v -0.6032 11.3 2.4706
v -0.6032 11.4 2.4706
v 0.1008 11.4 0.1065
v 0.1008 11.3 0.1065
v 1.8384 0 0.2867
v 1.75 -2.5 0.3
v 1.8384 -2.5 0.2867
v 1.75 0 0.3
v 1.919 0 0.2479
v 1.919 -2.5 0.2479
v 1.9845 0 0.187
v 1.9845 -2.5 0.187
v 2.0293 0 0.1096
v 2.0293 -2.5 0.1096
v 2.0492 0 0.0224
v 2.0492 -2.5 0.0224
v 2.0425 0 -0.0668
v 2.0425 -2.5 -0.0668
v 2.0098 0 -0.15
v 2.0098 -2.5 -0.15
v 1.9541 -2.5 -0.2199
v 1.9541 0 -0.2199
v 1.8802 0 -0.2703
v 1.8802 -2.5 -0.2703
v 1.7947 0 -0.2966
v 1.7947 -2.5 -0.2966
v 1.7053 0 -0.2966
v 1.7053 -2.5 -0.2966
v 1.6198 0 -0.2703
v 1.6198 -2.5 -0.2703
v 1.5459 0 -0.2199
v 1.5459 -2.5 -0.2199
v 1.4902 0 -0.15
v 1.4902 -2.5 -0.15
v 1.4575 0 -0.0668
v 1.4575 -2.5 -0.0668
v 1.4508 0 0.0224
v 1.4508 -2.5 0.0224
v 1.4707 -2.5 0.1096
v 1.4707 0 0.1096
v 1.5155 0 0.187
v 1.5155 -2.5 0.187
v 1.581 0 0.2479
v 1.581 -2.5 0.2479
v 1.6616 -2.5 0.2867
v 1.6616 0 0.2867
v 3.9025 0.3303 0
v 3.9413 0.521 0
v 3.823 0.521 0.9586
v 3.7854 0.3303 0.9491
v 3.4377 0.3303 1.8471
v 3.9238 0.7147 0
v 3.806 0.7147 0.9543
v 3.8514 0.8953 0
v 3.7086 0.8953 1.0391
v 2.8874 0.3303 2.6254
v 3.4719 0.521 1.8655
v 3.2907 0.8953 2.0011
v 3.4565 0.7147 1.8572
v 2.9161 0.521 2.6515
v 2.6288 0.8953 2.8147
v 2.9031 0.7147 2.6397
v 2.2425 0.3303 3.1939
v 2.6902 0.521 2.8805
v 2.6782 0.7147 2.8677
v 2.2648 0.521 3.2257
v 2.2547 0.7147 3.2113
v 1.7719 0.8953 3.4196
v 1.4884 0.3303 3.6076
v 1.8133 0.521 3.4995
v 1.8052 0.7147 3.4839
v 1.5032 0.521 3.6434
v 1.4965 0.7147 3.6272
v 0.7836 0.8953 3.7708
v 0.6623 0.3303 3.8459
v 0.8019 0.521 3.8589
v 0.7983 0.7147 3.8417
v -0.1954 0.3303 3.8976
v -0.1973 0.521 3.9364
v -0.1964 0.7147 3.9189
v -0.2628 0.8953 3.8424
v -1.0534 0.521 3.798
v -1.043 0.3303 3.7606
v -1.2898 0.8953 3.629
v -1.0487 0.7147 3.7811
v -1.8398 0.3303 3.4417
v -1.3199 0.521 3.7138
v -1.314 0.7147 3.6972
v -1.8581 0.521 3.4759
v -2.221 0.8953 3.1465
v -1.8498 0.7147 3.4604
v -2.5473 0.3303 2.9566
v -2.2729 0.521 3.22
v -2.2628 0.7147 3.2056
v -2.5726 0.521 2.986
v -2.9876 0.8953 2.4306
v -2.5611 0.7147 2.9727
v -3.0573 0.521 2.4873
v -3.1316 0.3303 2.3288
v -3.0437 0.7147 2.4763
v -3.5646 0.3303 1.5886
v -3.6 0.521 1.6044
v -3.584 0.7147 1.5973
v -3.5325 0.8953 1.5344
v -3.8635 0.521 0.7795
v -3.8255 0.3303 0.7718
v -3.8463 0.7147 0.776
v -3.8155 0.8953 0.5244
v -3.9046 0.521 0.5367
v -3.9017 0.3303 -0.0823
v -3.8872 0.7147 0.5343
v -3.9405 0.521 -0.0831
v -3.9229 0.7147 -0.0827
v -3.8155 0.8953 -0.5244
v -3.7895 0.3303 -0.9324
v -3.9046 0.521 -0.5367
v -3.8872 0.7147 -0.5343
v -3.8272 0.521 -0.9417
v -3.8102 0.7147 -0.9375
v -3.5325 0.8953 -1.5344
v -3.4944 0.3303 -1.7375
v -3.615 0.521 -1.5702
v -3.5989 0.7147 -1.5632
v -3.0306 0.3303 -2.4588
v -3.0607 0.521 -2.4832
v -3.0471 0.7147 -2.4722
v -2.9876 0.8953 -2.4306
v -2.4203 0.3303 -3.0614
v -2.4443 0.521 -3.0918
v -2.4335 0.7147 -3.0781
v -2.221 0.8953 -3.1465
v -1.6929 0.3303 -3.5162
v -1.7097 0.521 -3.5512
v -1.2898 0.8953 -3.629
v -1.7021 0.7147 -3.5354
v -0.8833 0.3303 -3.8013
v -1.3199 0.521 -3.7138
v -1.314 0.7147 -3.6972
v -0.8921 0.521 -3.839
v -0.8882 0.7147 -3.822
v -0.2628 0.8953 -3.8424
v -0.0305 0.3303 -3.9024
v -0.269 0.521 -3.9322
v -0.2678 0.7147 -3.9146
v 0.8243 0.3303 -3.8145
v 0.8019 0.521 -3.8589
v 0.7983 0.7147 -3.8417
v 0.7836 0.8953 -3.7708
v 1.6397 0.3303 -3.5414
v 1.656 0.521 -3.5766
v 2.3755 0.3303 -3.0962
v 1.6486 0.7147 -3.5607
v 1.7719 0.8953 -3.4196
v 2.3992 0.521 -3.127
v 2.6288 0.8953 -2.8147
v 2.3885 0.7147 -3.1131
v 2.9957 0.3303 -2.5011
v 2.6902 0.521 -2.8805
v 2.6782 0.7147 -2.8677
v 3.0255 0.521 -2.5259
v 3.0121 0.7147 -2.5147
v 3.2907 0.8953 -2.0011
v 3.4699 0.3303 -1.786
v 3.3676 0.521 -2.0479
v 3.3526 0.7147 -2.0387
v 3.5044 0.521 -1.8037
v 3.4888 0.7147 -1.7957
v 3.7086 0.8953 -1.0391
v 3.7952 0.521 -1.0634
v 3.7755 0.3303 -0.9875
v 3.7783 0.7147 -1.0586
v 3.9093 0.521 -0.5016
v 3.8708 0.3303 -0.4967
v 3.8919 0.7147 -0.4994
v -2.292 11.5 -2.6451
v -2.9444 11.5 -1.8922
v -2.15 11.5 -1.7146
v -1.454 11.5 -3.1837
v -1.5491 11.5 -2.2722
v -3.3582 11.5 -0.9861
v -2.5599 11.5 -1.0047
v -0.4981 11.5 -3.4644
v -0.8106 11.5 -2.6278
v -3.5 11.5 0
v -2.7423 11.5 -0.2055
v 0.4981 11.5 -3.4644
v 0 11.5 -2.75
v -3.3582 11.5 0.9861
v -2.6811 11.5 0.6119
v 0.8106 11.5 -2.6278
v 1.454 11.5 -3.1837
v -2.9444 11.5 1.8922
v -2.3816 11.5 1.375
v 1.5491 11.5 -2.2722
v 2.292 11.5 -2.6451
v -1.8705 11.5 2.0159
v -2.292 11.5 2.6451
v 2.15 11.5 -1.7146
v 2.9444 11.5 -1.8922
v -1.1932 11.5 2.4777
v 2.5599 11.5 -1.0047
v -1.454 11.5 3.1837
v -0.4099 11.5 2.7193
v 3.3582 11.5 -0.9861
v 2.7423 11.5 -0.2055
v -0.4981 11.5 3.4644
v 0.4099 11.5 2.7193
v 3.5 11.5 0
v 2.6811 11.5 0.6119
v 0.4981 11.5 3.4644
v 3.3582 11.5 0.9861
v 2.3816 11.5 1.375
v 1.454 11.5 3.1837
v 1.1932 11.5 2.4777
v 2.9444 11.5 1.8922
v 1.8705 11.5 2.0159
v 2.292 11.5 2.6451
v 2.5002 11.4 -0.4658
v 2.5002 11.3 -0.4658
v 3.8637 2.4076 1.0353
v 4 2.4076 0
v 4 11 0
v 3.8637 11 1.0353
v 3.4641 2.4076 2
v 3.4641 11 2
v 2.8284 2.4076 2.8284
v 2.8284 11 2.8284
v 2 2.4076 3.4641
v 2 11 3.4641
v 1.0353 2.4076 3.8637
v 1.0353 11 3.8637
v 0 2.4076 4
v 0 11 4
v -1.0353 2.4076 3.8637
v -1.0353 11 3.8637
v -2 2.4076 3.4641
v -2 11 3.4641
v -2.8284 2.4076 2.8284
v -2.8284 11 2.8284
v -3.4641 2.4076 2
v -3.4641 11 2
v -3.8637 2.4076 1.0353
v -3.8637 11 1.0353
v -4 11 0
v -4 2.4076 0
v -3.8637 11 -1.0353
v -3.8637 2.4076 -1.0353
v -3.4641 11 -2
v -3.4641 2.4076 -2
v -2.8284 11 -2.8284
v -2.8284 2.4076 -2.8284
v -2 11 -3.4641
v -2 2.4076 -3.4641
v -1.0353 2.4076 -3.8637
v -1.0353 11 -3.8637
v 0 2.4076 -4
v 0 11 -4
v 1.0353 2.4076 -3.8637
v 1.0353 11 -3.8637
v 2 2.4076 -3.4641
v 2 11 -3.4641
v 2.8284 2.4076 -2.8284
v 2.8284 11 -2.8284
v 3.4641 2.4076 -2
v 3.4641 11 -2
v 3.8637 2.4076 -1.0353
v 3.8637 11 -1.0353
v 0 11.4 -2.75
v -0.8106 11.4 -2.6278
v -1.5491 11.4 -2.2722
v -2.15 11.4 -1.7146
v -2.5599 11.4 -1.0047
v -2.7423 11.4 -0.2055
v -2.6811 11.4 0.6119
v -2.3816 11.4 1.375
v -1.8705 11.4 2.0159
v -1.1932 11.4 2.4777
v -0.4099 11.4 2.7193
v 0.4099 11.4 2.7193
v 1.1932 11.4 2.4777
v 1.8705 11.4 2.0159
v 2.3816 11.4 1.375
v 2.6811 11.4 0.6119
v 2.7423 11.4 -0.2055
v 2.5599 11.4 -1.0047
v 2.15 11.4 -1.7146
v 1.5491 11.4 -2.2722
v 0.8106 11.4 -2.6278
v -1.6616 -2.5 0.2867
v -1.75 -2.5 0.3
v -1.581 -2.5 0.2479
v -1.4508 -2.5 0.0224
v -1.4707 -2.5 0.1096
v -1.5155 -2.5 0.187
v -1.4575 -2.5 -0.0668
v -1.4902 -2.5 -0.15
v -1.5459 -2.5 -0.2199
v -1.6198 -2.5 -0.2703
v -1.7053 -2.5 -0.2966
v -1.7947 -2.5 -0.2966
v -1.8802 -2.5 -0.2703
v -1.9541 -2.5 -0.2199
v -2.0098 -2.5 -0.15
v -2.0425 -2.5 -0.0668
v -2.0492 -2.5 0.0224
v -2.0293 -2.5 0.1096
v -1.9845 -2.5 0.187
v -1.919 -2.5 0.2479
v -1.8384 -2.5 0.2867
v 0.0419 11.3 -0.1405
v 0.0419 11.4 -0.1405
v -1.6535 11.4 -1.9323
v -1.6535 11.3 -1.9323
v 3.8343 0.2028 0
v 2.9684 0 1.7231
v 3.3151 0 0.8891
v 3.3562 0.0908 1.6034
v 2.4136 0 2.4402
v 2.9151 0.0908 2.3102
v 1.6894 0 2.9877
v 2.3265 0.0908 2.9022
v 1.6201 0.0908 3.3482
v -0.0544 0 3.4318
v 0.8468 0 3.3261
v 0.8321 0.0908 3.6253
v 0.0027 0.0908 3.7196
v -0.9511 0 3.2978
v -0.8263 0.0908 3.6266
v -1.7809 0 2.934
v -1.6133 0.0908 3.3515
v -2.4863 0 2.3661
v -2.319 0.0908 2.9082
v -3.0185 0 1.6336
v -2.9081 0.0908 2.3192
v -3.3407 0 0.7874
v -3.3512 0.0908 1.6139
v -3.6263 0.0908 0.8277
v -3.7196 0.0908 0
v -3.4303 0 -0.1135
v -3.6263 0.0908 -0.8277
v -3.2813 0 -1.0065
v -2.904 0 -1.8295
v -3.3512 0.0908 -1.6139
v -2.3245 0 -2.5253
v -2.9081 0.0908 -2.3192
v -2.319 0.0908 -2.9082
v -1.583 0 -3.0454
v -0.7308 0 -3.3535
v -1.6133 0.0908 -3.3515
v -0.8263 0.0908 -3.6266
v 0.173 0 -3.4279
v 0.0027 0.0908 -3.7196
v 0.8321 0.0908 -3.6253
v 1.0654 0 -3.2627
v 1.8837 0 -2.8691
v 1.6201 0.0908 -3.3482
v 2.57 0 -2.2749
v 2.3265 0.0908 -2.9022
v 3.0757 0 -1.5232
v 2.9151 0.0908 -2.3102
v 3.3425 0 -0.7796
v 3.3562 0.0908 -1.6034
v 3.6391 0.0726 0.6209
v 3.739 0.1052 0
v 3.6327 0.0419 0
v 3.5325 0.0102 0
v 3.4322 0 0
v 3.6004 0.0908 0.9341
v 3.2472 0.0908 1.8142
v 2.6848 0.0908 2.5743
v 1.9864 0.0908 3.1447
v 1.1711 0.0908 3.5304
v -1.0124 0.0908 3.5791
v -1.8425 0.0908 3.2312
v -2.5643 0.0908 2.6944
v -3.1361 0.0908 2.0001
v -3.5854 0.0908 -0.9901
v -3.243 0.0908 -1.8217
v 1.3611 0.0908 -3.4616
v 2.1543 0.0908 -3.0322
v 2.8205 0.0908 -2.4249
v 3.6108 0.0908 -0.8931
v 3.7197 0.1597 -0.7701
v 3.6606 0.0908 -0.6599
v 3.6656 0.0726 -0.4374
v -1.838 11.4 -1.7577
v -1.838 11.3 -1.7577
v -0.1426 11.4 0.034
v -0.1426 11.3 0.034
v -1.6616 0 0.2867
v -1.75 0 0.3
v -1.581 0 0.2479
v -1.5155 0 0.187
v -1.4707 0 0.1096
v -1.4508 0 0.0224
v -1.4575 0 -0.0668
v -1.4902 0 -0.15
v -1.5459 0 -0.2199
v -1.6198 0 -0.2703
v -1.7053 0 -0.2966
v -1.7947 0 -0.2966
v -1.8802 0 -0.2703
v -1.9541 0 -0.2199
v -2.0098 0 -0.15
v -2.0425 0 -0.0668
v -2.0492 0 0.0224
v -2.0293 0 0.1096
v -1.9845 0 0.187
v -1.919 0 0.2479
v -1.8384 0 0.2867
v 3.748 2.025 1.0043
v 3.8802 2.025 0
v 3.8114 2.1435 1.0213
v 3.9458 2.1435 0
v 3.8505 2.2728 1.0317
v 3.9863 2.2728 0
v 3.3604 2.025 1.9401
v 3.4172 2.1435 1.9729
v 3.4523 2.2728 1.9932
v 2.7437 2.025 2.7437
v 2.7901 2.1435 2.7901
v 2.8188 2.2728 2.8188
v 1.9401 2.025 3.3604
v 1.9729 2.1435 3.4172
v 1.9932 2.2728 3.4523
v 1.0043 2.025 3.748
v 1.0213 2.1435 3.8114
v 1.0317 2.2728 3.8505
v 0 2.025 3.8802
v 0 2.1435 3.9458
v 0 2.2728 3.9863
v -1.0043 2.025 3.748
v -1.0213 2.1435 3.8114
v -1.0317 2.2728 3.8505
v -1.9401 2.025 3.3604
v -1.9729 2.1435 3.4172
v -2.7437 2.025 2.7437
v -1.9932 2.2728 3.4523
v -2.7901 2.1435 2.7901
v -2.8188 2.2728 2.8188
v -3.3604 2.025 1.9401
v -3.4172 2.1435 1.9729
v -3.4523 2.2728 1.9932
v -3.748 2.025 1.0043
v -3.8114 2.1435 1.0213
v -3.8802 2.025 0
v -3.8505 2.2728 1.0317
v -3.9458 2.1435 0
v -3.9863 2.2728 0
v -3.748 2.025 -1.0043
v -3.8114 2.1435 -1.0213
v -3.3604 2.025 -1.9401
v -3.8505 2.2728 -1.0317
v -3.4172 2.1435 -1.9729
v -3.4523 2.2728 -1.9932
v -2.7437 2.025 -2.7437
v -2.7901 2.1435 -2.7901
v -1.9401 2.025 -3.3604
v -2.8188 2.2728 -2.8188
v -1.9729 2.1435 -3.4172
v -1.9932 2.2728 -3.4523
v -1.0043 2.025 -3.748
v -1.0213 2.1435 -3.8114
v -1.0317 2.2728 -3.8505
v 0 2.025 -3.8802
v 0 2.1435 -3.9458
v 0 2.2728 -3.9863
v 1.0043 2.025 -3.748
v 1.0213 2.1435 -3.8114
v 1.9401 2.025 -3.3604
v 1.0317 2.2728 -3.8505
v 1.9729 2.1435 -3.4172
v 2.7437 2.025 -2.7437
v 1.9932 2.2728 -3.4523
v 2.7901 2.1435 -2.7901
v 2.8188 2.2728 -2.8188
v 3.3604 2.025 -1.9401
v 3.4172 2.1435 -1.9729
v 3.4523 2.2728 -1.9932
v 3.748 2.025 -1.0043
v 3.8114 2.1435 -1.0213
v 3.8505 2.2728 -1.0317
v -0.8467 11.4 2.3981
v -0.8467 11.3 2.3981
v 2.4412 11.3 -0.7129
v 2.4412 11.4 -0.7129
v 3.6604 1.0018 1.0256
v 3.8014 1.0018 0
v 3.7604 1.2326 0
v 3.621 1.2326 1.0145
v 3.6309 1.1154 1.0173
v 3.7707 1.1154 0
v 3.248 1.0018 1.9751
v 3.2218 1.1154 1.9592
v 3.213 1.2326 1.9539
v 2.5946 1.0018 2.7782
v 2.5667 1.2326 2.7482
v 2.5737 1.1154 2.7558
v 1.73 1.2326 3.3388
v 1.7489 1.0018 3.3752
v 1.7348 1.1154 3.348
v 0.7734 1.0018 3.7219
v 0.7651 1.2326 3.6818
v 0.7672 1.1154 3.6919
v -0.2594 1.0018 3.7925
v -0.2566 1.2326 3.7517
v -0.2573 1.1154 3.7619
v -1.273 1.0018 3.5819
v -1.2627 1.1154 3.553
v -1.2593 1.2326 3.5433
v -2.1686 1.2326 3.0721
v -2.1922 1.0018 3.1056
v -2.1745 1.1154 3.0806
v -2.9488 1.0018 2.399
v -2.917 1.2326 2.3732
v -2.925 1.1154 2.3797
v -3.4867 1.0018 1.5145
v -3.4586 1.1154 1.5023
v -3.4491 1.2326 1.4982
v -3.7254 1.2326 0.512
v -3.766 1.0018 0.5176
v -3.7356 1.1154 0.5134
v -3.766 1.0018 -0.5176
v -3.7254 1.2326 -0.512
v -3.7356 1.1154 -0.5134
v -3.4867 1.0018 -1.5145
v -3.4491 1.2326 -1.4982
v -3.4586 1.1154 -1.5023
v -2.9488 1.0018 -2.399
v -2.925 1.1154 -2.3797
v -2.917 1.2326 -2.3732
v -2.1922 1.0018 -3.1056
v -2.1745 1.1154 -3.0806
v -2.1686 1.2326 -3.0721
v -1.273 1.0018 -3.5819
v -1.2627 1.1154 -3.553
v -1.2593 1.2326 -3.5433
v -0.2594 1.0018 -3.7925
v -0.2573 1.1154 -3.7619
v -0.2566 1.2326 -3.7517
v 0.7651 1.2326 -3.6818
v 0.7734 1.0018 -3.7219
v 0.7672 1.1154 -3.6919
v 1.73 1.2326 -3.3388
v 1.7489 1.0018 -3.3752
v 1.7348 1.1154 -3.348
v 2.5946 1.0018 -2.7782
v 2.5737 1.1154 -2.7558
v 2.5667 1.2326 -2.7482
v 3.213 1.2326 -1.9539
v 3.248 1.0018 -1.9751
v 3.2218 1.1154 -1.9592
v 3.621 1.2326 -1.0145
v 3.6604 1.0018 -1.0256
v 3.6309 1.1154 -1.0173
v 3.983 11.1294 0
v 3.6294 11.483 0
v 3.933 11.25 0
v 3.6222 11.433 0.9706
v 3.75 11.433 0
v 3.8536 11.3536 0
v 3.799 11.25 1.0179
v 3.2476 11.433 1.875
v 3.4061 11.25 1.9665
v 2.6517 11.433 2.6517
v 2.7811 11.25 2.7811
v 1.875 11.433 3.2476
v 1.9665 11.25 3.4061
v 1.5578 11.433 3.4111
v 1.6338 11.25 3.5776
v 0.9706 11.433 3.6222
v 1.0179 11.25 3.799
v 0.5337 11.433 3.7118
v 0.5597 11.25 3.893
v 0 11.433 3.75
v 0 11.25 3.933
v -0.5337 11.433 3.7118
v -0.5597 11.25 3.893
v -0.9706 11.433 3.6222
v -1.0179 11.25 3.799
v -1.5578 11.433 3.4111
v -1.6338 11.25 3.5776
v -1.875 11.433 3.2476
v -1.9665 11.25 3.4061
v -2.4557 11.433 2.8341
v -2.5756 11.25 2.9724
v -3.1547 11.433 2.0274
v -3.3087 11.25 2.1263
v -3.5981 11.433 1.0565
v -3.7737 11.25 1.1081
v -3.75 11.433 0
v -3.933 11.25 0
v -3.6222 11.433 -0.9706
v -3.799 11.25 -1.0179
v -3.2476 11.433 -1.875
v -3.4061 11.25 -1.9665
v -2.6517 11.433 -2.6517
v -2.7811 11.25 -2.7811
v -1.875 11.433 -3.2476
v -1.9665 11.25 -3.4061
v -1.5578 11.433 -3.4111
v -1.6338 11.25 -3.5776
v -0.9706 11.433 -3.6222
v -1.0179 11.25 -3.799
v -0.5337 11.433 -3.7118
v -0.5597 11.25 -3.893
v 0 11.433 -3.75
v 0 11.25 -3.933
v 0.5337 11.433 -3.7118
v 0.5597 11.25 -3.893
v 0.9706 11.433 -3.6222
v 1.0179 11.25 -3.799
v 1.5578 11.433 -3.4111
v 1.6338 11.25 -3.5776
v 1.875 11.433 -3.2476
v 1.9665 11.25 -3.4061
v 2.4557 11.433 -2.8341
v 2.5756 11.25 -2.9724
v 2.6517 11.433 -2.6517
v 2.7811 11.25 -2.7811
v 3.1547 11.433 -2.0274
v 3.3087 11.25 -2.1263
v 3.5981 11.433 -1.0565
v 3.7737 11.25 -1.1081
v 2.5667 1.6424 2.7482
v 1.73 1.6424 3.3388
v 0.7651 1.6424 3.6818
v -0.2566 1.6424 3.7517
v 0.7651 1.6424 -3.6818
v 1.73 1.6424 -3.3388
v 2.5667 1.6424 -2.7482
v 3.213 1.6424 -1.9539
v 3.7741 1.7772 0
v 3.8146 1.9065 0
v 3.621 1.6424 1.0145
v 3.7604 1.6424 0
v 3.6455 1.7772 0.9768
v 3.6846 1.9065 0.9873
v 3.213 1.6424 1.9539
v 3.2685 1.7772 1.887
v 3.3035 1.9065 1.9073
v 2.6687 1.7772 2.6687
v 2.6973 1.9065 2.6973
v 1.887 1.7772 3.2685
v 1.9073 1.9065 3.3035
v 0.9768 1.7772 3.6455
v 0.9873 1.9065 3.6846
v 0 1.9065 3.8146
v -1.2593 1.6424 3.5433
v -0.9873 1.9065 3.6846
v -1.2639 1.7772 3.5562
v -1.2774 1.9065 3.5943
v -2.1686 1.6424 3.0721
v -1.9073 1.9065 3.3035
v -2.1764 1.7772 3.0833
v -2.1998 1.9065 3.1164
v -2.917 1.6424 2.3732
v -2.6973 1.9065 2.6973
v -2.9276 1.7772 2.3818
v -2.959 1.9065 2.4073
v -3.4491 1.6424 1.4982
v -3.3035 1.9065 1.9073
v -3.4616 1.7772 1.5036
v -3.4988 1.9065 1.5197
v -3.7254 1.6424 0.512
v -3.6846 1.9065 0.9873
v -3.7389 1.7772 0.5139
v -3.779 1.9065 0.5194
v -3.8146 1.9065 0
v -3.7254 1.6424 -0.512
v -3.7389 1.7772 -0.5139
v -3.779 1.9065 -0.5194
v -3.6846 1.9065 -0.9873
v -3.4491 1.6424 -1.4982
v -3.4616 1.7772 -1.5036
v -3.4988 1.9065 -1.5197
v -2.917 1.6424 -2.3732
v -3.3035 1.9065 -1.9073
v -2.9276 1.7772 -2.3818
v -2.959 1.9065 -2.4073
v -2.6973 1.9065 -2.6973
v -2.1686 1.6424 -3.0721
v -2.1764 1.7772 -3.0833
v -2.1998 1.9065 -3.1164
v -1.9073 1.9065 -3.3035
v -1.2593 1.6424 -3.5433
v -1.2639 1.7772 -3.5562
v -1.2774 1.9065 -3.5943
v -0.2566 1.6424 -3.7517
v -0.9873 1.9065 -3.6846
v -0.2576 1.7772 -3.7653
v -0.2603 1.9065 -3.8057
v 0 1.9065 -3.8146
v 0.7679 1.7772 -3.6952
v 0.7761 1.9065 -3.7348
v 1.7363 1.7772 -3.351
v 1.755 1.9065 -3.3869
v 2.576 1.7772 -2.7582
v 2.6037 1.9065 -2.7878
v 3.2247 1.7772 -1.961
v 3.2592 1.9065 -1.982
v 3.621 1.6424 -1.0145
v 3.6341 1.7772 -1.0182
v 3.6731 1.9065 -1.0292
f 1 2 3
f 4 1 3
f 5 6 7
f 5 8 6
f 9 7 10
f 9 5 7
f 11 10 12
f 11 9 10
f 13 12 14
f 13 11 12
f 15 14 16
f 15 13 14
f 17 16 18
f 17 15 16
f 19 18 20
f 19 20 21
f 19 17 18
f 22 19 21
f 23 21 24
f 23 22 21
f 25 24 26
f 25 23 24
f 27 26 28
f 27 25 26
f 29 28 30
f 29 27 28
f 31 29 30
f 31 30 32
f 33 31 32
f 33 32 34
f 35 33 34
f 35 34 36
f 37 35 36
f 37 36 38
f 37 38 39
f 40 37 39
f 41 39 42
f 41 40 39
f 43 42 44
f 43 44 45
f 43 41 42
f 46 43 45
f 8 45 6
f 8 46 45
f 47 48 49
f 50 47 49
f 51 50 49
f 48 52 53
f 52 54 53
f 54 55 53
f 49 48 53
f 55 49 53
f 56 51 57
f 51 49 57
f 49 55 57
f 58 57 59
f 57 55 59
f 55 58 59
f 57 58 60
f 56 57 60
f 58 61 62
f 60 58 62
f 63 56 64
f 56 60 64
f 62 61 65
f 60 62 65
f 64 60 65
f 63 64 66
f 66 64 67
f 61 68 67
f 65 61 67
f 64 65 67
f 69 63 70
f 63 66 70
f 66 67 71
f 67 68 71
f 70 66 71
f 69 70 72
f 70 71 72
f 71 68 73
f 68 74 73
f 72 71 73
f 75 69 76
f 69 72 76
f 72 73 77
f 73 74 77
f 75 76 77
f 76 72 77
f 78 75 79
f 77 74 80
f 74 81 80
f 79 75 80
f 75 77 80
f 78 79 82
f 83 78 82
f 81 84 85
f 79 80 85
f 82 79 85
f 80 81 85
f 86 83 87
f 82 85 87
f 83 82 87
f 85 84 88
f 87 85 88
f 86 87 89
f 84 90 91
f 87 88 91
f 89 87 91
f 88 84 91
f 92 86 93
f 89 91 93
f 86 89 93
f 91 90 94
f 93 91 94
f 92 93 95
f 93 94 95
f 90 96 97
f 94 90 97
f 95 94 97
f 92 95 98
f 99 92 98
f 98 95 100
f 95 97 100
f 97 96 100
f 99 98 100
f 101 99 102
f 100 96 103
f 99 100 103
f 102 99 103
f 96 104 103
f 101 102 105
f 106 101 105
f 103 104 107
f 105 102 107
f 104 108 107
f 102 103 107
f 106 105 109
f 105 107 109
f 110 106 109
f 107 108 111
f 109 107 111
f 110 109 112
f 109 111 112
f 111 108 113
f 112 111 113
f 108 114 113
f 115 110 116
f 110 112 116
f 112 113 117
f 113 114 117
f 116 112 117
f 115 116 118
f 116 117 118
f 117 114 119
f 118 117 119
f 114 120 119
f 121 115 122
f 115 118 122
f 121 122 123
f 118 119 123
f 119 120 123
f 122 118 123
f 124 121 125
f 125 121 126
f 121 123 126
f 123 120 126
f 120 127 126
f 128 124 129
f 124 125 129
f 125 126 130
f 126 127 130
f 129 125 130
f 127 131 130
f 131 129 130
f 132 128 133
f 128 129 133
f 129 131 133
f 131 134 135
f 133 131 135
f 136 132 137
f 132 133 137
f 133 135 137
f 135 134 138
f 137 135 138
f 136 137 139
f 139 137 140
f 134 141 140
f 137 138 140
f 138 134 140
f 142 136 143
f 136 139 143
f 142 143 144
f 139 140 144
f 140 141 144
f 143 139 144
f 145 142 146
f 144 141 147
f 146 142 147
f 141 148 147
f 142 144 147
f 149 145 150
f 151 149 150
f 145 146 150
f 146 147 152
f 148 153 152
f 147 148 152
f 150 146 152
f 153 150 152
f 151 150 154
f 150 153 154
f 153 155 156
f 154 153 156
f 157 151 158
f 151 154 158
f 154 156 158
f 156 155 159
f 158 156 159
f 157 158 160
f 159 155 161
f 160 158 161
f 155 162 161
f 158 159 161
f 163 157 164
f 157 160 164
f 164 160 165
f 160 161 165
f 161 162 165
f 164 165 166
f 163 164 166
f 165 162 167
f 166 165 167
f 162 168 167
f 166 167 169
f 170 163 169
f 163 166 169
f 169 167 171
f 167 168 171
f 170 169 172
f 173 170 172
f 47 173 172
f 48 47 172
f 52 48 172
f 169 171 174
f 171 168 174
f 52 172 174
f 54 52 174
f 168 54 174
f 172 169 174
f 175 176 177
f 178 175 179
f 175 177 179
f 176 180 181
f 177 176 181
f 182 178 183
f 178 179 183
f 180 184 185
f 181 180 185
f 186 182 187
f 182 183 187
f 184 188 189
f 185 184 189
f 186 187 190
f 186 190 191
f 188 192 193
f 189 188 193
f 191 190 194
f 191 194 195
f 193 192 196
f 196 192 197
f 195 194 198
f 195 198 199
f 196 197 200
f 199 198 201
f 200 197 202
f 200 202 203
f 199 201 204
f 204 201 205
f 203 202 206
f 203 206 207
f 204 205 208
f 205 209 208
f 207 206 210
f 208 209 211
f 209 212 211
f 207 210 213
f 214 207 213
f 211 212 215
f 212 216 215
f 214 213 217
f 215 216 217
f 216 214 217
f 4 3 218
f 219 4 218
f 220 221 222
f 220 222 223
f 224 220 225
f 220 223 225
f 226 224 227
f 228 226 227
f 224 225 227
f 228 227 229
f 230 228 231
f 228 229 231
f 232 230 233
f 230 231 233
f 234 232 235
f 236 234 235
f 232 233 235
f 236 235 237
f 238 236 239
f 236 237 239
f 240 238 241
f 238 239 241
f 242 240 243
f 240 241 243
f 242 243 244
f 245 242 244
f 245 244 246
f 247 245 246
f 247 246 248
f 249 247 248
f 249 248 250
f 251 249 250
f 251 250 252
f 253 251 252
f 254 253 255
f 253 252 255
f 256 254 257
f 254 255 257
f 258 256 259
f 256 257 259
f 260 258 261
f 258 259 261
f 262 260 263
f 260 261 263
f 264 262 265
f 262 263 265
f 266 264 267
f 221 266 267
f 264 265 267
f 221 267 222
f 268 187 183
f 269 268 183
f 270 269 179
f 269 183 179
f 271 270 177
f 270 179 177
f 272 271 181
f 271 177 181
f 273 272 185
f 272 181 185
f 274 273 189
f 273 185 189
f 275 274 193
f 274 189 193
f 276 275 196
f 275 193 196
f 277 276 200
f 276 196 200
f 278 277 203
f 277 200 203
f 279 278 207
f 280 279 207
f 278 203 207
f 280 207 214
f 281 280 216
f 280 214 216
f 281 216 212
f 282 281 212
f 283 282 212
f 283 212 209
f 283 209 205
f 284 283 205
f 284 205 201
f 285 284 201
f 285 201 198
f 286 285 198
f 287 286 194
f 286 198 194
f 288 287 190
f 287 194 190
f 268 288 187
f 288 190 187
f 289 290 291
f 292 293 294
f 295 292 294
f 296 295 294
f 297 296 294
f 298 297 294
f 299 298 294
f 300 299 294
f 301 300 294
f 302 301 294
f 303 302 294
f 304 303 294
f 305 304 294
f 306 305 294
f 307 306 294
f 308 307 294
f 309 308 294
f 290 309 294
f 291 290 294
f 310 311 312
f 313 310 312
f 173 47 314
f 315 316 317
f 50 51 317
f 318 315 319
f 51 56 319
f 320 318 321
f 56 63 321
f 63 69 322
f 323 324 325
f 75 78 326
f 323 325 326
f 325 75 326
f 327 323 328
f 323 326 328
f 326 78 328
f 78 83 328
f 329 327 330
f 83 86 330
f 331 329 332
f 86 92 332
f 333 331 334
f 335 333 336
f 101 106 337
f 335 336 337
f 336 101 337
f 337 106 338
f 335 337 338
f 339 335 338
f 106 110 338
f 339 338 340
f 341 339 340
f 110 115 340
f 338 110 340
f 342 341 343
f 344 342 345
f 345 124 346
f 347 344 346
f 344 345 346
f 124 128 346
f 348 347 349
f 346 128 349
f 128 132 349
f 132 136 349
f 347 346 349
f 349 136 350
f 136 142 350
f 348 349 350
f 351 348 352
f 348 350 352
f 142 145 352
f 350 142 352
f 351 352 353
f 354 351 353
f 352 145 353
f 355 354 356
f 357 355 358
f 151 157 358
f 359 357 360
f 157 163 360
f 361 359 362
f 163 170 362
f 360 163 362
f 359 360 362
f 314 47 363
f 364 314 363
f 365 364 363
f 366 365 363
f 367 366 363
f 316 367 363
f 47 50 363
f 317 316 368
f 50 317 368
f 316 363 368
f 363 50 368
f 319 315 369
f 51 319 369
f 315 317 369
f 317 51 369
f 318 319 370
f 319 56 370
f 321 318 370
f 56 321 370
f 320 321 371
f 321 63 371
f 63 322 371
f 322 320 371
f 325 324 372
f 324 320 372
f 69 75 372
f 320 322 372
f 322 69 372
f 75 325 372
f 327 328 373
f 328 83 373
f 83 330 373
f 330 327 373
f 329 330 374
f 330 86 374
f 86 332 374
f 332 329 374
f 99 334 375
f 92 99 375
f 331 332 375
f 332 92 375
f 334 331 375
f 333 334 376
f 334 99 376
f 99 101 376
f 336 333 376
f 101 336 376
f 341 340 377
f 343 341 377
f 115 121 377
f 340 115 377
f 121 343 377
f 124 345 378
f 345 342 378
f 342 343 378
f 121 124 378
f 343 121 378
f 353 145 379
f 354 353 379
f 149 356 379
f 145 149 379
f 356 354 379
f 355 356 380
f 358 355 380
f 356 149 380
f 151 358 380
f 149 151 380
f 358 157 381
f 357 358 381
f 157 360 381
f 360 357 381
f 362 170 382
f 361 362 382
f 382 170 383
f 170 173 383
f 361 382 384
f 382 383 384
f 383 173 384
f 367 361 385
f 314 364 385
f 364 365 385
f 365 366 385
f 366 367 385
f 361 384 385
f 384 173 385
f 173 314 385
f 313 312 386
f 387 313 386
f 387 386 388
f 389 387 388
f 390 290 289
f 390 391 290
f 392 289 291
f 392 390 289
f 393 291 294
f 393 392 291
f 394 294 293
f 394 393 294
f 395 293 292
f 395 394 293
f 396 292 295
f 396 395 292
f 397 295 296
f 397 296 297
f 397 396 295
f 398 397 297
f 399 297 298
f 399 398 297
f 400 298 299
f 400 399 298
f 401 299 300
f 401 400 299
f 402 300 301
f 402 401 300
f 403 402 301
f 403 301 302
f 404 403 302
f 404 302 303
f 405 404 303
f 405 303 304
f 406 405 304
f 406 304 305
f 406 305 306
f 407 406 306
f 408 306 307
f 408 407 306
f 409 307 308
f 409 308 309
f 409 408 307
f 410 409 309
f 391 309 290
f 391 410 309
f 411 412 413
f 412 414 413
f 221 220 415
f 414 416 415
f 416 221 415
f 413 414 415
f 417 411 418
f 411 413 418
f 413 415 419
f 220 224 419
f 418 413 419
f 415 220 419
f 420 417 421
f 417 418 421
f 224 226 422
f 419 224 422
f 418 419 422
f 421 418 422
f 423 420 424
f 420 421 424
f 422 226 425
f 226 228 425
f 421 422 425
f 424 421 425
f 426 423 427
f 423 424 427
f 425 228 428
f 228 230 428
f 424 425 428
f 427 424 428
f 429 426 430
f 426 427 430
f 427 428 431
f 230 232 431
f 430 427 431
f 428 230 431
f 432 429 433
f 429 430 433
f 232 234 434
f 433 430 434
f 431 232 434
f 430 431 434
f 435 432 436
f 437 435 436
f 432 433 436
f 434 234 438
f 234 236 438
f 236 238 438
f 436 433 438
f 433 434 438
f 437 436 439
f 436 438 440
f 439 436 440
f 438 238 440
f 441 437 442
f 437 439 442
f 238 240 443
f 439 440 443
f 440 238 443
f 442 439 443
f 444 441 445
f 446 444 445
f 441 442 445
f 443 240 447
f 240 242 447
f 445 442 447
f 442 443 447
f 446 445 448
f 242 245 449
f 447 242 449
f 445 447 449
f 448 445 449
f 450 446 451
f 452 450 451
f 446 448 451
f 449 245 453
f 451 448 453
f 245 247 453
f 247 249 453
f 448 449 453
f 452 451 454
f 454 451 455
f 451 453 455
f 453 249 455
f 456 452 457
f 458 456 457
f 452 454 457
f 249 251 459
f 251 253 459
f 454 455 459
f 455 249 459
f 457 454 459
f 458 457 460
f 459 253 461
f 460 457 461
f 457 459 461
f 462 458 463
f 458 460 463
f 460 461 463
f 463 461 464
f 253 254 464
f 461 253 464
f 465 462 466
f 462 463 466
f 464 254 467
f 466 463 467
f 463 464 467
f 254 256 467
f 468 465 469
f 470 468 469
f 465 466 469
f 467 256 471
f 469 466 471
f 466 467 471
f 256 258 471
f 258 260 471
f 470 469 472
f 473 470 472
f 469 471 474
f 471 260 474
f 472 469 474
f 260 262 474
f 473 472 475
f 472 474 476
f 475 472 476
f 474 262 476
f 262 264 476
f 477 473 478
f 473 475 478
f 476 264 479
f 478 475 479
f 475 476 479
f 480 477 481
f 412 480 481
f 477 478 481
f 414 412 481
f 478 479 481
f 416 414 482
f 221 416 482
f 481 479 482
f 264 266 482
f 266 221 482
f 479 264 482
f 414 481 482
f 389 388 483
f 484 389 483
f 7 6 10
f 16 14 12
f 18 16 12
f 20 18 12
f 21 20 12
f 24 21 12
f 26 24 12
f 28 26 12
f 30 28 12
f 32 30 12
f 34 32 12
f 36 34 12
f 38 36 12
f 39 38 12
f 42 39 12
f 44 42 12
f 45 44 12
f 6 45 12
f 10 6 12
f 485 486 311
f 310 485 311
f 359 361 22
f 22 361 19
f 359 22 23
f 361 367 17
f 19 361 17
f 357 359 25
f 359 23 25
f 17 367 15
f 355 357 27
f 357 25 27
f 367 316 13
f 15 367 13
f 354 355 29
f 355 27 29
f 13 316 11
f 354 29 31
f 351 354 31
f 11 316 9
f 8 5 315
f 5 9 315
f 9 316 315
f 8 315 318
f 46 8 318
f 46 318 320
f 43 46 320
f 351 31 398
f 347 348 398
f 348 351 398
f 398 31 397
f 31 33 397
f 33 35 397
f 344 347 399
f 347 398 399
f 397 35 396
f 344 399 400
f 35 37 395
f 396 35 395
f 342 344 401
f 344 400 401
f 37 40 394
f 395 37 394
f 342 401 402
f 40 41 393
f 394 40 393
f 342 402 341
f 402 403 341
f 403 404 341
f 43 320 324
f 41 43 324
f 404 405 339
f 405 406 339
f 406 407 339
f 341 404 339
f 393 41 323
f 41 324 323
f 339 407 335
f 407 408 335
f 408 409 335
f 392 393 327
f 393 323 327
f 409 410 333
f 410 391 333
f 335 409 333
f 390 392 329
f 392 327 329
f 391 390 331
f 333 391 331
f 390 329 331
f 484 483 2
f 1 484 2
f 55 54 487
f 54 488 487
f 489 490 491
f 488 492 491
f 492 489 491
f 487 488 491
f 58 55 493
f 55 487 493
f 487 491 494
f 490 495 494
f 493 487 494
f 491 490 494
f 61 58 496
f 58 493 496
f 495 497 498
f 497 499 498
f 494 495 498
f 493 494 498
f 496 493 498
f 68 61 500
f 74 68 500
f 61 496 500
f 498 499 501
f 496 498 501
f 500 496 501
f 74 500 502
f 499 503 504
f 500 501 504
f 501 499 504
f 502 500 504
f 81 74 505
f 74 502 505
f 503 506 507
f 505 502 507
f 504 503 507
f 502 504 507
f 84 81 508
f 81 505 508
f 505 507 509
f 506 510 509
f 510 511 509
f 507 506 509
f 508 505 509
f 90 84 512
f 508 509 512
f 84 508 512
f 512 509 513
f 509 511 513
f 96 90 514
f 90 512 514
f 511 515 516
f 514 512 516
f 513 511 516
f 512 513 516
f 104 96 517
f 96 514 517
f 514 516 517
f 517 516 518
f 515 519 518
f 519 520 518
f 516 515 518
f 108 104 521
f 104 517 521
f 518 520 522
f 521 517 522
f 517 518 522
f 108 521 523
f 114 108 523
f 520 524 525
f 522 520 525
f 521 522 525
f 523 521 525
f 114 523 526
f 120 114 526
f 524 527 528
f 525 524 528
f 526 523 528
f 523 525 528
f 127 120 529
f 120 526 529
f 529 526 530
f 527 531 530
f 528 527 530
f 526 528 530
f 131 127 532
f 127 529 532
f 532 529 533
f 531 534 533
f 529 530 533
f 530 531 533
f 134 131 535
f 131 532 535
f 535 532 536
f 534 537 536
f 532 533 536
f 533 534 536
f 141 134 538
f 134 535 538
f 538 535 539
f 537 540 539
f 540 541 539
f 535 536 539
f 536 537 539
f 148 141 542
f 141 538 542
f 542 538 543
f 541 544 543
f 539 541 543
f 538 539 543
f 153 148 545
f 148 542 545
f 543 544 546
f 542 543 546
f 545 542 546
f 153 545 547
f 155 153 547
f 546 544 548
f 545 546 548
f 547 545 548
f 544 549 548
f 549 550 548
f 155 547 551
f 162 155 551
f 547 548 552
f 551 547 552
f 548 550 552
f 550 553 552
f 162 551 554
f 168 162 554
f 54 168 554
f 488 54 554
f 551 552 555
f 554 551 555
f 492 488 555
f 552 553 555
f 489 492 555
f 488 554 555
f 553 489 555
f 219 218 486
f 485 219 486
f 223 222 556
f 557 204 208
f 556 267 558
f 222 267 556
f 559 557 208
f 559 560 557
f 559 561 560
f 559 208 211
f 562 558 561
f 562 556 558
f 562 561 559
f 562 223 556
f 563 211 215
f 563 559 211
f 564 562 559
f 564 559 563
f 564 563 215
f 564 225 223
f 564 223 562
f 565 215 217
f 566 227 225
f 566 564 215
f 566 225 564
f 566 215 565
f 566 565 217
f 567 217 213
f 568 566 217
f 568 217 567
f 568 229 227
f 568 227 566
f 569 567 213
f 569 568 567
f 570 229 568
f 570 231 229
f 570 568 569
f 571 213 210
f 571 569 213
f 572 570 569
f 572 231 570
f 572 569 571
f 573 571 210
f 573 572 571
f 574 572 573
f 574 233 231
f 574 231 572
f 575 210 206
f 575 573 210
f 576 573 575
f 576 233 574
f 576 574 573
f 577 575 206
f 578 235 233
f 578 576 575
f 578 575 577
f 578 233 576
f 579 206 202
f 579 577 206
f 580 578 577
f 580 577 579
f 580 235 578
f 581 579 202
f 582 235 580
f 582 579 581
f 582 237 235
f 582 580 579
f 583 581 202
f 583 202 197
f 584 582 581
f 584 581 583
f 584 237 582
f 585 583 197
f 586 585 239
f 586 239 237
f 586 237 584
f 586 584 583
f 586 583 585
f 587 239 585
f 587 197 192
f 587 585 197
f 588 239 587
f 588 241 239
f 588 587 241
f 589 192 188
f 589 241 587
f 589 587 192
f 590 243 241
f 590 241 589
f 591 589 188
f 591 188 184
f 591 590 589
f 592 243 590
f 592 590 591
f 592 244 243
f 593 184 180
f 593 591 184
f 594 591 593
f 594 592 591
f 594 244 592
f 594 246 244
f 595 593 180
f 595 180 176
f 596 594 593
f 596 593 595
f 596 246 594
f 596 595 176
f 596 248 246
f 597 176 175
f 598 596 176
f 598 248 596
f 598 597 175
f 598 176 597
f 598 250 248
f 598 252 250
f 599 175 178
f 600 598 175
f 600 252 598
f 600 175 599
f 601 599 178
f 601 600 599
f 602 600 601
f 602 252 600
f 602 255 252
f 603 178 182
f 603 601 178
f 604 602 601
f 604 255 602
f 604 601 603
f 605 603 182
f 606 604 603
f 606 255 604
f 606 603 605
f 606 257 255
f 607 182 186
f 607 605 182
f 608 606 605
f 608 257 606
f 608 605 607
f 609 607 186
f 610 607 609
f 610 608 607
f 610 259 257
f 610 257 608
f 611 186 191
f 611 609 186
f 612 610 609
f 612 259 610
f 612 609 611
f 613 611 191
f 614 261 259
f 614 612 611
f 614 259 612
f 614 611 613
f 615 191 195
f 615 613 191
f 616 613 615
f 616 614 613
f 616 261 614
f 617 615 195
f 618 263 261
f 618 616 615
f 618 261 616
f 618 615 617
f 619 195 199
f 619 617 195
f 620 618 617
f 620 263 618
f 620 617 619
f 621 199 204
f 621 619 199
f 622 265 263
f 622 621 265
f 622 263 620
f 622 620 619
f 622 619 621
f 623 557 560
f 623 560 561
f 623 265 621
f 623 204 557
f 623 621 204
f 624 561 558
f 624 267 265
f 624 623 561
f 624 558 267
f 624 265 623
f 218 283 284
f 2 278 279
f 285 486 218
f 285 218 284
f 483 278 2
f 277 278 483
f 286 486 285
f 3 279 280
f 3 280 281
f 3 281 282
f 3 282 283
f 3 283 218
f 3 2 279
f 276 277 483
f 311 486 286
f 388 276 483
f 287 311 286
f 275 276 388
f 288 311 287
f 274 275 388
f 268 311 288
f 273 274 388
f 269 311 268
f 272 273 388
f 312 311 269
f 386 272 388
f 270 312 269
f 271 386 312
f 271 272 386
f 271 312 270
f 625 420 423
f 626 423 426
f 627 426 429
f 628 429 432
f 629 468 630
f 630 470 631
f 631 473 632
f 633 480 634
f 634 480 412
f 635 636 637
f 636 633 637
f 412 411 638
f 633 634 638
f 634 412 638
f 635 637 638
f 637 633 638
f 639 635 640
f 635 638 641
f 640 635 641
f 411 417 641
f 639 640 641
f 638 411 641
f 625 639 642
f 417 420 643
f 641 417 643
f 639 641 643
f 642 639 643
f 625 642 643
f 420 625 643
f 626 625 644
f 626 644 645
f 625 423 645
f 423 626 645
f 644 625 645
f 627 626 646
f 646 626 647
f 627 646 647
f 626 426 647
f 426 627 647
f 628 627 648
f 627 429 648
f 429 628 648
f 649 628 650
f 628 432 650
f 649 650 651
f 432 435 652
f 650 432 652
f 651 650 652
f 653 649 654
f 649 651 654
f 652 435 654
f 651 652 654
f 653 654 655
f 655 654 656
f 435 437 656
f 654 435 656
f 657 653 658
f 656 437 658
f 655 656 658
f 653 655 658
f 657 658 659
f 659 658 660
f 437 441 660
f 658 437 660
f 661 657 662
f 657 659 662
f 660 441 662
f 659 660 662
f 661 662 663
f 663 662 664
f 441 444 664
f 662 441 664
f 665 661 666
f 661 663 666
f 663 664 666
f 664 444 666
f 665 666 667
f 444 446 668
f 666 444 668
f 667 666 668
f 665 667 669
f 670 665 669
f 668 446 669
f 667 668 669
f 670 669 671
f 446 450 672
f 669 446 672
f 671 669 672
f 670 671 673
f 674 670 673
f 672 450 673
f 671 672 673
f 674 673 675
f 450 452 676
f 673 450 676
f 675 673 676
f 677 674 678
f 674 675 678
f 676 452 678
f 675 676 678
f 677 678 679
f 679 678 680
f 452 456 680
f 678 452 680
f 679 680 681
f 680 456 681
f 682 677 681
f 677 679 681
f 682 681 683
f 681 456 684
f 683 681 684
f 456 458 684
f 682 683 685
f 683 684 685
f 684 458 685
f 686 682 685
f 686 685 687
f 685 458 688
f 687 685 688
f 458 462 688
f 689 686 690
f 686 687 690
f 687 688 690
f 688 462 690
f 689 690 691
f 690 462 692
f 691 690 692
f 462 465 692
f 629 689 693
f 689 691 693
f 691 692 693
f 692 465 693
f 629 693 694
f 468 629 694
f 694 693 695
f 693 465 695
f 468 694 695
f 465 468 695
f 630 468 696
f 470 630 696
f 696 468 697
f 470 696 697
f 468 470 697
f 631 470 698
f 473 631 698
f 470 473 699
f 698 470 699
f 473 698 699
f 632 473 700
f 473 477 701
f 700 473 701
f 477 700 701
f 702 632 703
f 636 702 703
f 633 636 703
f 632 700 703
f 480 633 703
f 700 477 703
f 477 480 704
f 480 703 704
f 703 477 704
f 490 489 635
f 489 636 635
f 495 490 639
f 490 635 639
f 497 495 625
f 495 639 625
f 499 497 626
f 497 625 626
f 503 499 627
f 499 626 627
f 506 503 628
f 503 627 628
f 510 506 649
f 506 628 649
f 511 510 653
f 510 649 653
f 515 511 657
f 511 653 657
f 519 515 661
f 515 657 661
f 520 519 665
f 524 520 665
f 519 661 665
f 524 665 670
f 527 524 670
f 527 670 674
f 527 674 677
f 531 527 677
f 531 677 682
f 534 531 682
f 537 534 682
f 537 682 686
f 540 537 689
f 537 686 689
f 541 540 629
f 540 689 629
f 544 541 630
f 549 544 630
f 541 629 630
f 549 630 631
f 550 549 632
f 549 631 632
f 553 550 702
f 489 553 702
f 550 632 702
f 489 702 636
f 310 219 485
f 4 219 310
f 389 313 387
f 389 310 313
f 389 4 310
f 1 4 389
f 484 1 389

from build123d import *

# Parameters (mm, degrees)
SKETCH2_R          = 2.75
CUT_EXTRUDE1_DEPTH = 0.1
CUT_EXTRUDE2_DEPTH = 0.1
SKETCH4_W          = 0.3
SKETCH4_H          = 2.5
SKETCH5_W          = 0.3
SKETCH5_H          = 2.5
FILLET1_R          = 0.5


with BuildPart() as part:
    # Sketch1 → Revolve1 (revolve)
    with BuildSketch(Plane.XY):
        with BuildLine():
            Line((4, 11.5), (0, 11.5))
            Line((0, 11.5), (0, 0))
            Line((0, 0), (3.643923536, 0))
            ThreePointArc((3.643923536, 0), (3.925044146, 0.40653797), (3.851388969, 0.895288247))
            ThreePointArc((3.851388969, 0.895288247), (3.78355892, 1.057917503), (3.760416667, 1.232599004))
            Line((3.760416667, 1.232599004), (3.760416667, 1.642400996))
            ThreePointArc((3.760416667, 1.642400996), (3.791064683, 1.842850794), (3.880208333, 2.024984899))
            ThreePointArc((3.880208333, 2.024984899), (3.969351983, 2.207119004), (4, 2.407568802))
            Line((4, 2.407568802), (4, 11.5))
        make_face()
    revolve(axis=Axis((0, 11.5, 0), (0, -1, 0)))

    # Sketch2 → Cut-Extrude1 (cut)
    with BuildSketch(Plane(origin=(0, 11.5, 0), x_dir=(-1, 0, 0), z_dir=(0, 1, 0))):
        with Locations(Location((0, 0, 0), (0, 0, 270))):
            Circle(SKETCH2_R)
    extrude(amount=-CUT_EXTRUDE1_DEPTH, mode=Mode.SUBTRACT)

    # Sketch3 → Cut-Extrude2 (cut)
    with BuildSketch(Plane(origin=(0, 11.4, 0), x_dir=(-1, 0, 0), z_dir=(0, 1, 0))):
        Polygon((1.653472744, -1.932293167), (1.837973446, -1.757720858), (0.142645036, 0.03402539), (0.846678598, 2.398095985), (0.603244193, 2.470592124), (-0.10078937, 0.10652153), (-2.500151342, -0.465802817), (-2.441217638, -0.712871266), (-0.041855666, -0.14054692), align=None)
    extrude(amount=-CUT_EXTRUDE2_DEPTH, mode=Mode.SUBTRACT)

    # Sketch4 → Revolve2 (revolve)
    with BuildSketch(Plane(origin=(0, 0, 0), x_dir=(-1, 0, 0), z_dir=(0, 0, -1)), mode=Mode.PRIVATE) as revolve2_sk:
        with Locations((-1.9, -1.25)):
            Rectangle(SKETCH4_W, SKETCH4_H)
    revolve(revolve2_sk.sketch.rotate(Axis((1.75, -2.5, 0), (0, 1, 0)), 270), axis=Axis((1.75, -2.5, 0), (0, 1, 0)))

    # Sketch5 → Revolve3 (revolve)
    with BuildSketch(Plane(origin=(0, 0, 0), x_dir=(-1, 0, 0), z_dir=(0, 0, -1)), mode=Mode.PRIVATE) as revolve3_sk:
        with Locations((1.6, -1.25)):
            Rectangle(SKETCH5_W, SKETCH5_H)
    revolve(revolve3_sk.sketch.rotate(Axis((-1.75, -2.5, 0), (0, 1, 0)), 270), axis=Axis((-1.75, -2.5, 0), (0, 1, 0)))

    # Fillet1
    fillet1_edges = [part.edges().sort_by_distance(p)[0] for p in [
        (-4, 11.5, 0),
        (-3.643923536, 0, 0),
    ]]
    fillet(fillet1_edges, radius=FILLET1_R)


solid = part.part
